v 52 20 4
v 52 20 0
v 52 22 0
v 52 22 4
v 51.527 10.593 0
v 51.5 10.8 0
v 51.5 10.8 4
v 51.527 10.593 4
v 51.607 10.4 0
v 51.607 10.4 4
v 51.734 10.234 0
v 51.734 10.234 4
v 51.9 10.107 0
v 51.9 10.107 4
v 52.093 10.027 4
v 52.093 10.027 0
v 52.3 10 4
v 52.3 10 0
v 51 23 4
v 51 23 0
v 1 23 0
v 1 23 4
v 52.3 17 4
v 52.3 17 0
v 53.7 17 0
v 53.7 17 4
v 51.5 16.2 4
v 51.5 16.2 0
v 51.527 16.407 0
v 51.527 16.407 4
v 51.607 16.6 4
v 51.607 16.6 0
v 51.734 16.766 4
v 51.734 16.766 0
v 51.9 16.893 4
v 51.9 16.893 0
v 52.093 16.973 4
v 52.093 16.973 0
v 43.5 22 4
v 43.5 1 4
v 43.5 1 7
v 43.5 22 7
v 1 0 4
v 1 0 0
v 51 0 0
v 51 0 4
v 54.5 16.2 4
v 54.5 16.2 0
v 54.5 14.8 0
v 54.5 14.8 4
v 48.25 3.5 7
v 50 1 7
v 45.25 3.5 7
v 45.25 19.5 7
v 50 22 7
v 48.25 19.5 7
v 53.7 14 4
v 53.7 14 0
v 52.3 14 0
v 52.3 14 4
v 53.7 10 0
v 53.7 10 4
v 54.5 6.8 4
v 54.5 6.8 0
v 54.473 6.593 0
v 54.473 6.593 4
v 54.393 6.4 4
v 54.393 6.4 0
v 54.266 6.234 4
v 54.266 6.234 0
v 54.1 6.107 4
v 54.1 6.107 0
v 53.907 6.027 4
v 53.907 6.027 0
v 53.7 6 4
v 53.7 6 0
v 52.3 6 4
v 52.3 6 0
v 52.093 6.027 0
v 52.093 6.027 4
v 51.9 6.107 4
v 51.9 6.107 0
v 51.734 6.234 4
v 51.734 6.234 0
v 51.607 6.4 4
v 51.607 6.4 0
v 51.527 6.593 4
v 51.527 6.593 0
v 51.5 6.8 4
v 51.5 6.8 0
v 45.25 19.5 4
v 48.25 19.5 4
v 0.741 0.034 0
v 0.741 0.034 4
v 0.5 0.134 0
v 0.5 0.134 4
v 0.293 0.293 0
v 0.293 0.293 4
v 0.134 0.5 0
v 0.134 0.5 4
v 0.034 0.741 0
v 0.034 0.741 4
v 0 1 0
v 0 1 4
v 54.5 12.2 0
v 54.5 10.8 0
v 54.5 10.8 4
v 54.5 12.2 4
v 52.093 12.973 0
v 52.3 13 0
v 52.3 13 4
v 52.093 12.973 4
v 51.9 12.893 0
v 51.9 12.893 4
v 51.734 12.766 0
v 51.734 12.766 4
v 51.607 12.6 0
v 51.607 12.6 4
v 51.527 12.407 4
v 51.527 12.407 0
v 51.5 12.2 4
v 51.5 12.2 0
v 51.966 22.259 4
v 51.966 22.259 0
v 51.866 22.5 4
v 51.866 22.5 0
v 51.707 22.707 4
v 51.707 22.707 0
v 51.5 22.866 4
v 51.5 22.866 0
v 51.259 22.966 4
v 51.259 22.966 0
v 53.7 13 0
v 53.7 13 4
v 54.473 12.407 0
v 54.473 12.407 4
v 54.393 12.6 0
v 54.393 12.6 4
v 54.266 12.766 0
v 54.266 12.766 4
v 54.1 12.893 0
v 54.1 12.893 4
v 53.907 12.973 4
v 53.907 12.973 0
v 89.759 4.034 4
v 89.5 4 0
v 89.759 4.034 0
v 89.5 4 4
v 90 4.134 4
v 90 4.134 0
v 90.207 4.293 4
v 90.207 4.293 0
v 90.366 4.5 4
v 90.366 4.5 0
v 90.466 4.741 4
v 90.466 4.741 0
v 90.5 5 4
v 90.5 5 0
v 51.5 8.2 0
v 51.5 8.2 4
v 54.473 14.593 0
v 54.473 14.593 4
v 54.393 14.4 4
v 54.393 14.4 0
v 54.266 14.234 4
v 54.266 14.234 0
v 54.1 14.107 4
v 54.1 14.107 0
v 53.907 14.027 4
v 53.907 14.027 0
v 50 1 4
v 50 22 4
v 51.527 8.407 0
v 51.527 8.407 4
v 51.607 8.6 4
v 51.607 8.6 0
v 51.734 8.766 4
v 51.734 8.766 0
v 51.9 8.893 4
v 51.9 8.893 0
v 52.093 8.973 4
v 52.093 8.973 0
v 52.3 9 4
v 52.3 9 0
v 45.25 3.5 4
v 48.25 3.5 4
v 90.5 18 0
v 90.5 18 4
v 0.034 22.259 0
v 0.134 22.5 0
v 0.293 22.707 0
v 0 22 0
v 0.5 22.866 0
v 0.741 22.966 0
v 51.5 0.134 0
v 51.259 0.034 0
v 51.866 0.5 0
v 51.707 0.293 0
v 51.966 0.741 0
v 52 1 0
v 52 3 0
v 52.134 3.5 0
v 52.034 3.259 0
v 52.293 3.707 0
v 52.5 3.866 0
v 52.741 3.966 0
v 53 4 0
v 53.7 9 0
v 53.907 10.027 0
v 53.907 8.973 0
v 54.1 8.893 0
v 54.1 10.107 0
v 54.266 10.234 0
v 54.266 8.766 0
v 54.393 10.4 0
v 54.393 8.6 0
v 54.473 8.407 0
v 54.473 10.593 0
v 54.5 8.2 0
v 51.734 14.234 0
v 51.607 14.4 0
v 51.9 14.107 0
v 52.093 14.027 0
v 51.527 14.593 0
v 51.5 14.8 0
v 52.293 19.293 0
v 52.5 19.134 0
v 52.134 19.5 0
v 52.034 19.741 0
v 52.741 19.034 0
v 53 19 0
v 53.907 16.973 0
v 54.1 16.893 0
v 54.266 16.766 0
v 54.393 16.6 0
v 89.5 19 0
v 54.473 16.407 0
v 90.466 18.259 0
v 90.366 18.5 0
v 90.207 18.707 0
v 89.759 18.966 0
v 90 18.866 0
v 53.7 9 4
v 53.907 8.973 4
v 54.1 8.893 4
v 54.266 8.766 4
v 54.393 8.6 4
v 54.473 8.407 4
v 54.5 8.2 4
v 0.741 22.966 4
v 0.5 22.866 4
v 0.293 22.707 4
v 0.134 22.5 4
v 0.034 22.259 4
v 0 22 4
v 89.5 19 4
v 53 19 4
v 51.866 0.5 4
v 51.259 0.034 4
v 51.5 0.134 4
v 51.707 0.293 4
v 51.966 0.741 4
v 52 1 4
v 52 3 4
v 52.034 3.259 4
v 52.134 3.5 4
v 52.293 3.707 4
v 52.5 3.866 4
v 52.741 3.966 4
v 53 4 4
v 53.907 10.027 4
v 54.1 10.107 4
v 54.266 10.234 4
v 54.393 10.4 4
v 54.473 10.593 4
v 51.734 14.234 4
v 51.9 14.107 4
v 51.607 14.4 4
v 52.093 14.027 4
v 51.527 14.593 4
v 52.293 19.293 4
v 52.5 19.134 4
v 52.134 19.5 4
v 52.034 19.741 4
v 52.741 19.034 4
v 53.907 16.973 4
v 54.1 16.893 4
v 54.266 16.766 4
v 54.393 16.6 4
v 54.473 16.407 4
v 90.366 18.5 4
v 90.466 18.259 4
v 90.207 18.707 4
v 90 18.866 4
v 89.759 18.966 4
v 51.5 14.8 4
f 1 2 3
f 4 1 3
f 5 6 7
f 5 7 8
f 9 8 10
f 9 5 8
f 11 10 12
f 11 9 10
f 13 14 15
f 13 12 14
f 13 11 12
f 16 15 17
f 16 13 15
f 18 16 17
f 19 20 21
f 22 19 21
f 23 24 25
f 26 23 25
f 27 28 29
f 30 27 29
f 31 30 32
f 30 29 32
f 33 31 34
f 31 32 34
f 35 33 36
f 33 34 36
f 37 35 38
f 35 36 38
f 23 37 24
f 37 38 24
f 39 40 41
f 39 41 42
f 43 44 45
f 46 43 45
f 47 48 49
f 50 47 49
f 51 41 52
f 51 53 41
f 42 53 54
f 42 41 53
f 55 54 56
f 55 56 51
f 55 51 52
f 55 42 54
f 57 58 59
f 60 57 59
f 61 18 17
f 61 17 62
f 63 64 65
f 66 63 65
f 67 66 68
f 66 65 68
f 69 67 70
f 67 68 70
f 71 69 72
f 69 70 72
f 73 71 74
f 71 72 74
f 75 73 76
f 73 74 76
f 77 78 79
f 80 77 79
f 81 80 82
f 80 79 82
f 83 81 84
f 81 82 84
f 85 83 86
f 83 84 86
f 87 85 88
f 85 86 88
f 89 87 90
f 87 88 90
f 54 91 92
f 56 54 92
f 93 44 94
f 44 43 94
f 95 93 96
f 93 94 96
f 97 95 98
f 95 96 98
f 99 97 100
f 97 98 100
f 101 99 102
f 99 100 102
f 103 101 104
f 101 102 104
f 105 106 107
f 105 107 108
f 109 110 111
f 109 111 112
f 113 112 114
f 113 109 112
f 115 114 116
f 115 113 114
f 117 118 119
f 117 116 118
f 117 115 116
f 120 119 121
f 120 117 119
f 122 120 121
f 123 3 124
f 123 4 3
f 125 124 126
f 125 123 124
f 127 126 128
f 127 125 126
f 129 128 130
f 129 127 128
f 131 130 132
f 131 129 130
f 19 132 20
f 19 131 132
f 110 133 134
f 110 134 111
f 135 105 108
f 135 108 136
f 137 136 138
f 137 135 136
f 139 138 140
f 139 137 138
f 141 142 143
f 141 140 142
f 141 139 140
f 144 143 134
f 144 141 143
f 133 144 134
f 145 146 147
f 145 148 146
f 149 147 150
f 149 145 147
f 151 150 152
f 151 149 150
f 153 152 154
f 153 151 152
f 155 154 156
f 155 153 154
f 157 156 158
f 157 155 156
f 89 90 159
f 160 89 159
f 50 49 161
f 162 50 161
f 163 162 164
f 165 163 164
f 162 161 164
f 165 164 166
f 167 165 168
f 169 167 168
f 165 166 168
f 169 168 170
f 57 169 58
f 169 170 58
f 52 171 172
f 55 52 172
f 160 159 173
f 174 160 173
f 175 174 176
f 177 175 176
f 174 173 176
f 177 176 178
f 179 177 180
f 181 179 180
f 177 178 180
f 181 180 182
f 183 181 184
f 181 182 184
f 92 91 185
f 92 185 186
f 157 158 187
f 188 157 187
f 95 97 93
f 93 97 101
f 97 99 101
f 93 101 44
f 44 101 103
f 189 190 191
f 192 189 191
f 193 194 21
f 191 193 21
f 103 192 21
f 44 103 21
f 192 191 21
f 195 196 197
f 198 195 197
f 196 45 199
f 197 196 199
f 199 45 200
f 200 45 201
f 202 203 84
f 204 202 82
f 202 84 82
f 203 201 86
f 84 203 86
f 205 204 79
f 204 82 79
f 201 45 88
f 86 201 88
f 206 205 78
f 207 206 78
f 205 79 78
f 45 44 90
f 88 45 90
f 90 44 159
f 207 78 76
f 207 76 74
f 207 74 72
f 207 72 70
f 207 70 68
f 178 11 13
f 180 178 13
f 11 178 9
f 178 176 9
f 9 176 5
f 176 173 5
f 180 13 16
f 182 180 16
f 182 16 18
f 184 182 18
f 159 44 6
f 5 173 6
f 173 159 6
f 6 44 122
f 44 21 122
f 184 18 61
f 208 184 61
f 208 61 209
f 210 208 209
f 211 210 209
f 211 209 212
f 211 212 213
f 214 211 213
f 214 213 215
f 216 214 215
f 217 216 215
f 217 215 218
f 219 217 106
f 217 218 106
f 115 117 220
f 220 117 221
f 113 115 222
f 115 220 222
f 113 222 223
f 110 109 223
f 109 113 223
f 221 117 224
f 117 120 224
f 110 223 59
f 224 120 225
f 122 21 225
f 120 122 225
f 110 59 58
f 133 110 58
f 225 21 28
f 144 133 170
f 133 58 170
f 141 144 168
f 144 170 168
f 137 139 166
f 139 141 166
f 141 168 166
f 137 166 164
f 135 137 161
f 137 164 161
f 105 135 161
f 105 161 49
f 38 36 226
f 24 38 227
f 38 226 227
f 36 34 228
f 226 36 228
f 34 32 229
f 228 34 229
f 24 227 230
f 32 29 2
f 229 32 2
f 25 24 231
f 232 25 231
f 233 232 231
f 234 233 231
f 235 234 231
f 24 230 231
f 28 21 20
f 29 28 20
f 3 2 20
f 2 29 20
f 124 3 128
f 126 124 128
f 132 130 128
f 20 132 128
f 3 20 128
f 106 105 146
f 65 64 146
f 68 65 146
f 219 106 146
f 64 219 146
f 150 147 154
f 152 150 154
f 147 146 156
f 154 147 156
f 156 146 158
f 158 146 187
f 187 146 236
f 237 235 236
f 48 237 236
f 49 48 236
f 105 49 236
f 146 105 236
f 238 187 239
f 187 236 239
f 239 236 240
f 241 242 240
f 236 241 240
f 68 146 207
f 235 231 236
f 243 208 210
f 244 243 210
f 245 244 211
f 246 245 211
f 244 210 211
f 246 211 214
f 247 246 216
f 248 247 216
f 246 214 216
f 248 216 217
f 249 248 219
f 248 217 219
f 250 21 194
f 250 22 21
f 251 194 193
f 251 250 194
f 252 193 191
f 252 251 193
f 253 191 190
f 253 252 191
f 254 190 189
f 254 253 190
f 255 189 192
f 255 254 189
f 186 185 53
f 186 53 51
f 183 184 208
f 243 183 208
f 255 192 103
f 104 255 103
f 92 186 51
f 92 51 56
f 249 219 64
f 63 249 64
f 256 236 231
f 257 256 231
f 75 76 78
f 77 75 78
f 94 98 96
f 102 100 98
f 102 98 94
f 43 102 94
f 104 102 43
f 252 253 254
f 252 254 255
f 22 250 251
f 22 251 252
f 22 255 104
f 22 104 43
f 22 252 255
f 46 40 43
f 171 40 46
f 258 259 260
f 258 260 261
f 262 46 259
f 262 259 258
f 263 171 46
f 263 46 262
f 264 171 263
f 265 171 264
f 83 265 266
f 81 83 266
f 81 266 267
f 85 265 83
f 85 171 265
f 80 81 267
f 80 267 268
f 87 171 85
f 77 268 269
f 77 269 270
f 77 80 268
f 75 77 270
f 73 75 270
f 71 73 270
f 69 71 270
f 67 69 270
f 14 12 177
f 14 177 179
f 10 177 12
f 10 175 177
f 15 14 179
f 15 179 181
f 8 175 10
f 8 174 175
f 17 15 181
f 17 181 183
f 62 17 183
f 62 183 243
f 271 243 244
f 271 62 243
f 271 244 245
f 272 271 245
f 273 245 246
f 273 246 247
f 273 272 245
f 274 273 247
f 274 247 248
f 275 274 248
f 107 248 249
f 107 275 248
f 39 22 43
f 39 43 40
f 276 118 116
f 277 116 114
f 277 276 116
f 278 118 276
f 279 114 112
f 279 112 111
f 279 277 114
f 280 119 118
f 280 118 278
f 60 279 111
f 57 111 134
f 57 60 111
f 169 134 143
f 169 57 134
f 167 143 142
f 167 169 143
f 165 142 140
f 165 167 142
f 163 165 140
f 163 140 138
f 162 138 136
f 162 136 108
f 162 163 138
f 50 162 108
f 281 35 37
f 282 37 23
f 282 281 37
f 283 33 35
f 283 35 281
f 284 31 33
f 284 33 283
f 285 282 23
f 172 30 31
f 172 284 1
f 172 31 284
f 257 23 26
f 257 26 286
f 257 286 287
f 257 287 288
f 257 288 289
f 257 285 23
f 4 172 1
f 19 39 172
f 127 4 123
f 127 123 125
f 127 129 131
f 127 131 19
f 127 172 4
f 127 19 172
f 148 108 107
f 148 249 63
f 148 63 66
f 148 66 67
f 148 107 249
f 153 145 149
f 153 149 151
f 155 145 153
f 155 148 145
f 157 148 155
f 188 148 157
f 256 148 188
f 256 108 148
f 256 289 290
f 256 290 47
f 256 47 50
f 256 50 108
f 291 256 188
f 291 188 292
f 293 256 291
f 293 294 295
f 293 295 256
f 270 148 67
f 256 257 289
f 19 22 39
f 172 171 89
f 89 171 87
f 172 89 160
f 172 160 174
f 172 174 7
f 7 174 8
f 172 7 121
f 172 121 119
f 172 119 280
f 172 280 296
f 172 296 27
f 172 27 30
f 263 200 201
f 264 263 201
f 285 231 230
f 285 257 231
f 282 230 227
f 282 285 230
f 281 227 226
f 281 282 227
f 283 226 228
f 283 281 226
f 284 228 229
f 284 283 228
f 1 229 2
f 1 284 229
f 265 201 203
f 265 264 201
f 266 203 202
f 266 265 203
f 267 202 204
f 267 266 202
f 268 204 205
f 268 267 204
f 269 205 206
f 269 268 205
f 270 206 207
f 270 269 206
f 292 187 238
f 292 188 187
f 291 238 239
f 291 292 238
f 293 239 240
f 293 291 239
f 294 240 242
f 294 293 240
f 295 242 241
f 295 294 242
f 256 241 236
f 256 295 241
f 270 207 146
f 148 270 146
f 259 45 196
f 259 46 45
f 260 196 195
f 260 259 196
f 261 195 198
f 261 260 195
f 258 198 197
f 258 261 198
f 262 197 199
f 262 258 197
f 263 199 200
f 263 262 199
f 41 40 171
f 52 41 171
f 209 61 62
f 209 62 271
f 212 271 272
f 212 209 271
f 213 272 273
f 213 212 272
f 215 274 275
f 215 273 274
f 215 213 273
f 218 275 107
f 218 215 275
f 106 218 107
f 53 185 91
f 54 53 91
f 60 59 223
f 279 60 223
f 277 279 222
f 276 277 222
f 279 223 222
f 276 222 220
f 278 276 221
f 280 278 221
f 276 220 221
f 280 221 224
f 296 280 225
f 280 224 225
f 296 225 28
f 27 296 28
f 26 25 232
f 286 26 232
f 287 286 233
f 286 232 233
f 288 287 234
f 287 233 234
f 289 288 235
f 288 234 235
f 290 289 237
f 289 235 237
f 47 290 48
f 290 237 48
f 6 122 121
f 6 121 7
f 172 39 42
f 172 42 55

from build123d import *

# Parameters (mm, degrees)
BOSS_EXTRUDE1_DEPTH = 4
FILLET1_R           = 1
SKETCH2_W           = 6.5
SKETCH2_H           = 21
SKETCH2_W_2         = 3
SKETCH2_H_2         = 16
BOSS_EXTRUDE2_DEPTH = 3
CUT_EXTRUDE3_DEPTH  = 94.63893421


with BuildPart() as part:
    # Sketch1 → Boss-Extrude1 (new body)
    with BuildSketch(Plane.XY):
        Polygon((0, 0), (52, 0), (52, 4), (90.5, 4), (90.5, 19), (52, 19), (52, 23), (0, 23), align=None)
    extrude(amount=BOSS_EXTRUDE1_DEPTH)

    # Fillet1
    fillet1_edges = [part.edges().sort_by_distance(p)[0] for p in [
        (0, 23, 2),
        (52, 23, 2),
        (52, 19, 2),
        (90.5, 19, 2),
        (90.5, 4, 2),
        (52, 4, 2),
        (52, 0, 2),
        (0, 0, 2),
    ]]
    fillet(fillet1_edges, radius=FILLET1_R)

    # Sketch2 → Boss-Extrude2 (add)
    with BuildSketch(Plane.XY.offset(4)):
        with Locations((46.75, 11.5)):
            Rectangle(SKETCH2_W, SKETCH2_H)
        with Locations((46.75, 11.5)):
            Rectangle(SKETCH2_W_2, SKETCH2_H_2, mode=Mode.SUBTRACT)
    extrude(amount=BOSS_EXTRUDE2_DEPTH)

    # Sketch3 → Cut-Extrude3 (cut, through all)
    with BuildSketch(Plane(origin=(0, 0, 0), x_dir=(-1, 0, 0), z_dir=(0, 0, -1))):
        with BuildLine():
            Line((-53.7, 14), (-52.3, 14))
            ThreePointArc((-52.3, 14), (-51.734314575, 14.234314575), (-51.5, 14.8))
            Line((-51.5, 14.8), (-51.5, 16.2))
            ThreePointArc((-51.5, 16.2), (-51.734314575, 16.765685425), (-52.3, 17))
            Line((-52.3, 17), (-53.7, 17))
            ThreePointArc((-53.7, 17), (-54.265685425, 16.765685425), (-54.5, 16.2))
            Line((-54.5, 16.2), (-54.5, 14.8))
            ThreePointArc((-54.5, 14.8), (-54.265685425, 14.234314575), (-53.7, 14))
        make_face()
        with BuildLine():
            Line((-52.3, 10), (-53.7, 10))
            ThreePointArc((-53.7, 10), (-54.265685425, 10.234314575), (-54.5, 10.8))
            Line((-54.5, 10.8), (-54.5, 12.2))
            ThreePointArc((-54.5, 12.2), (-54.265685425, 12.765685425), (-53.7, 13))
            Line((-53.7, 13), (-52.3, 13))
            ThreePointArc((-52.3, 13), (-51.734314575, 12.765685425), (-51.5, 12.2))
            Line((-51.5, 12.2), (-51.5, 10.8))
            ThreePointArc((-51.5, 10.8), (-51.734314575, 10.234314575), (-52.3, 10))
        make_face()
        with BuildLine():
            Line((-53.7, 6), (-52.3, 6))
            ThreePointArc((-52.3, 6), (-51.734314575, 6.234314575), (-51.5, 6.8))
            Line((-51.5, 6.8), (-51.5, 8.2))
            ThreePointArc((-51.5, 8.2), (-51.734314575, 8.765685425), (-52.3, 9))
            Line((-52.3, 9), (-53.7, 9))
            ThreePointArc((-53.7, 9), (-54.265685425, 8.765685425), (-54.5, 8.2))
            Line((-54.5, 8.2), (-54.5, 6.8))
            ThreePointArc((-54.5, 6.8), (-54.265685425, 6.234314575), (-53.7, 6))
        make_face()
    extrude(amount=-CUT_EXTRUDE3_DEPTH, mode=Mode.SUBTRACT)


solid = part.part
